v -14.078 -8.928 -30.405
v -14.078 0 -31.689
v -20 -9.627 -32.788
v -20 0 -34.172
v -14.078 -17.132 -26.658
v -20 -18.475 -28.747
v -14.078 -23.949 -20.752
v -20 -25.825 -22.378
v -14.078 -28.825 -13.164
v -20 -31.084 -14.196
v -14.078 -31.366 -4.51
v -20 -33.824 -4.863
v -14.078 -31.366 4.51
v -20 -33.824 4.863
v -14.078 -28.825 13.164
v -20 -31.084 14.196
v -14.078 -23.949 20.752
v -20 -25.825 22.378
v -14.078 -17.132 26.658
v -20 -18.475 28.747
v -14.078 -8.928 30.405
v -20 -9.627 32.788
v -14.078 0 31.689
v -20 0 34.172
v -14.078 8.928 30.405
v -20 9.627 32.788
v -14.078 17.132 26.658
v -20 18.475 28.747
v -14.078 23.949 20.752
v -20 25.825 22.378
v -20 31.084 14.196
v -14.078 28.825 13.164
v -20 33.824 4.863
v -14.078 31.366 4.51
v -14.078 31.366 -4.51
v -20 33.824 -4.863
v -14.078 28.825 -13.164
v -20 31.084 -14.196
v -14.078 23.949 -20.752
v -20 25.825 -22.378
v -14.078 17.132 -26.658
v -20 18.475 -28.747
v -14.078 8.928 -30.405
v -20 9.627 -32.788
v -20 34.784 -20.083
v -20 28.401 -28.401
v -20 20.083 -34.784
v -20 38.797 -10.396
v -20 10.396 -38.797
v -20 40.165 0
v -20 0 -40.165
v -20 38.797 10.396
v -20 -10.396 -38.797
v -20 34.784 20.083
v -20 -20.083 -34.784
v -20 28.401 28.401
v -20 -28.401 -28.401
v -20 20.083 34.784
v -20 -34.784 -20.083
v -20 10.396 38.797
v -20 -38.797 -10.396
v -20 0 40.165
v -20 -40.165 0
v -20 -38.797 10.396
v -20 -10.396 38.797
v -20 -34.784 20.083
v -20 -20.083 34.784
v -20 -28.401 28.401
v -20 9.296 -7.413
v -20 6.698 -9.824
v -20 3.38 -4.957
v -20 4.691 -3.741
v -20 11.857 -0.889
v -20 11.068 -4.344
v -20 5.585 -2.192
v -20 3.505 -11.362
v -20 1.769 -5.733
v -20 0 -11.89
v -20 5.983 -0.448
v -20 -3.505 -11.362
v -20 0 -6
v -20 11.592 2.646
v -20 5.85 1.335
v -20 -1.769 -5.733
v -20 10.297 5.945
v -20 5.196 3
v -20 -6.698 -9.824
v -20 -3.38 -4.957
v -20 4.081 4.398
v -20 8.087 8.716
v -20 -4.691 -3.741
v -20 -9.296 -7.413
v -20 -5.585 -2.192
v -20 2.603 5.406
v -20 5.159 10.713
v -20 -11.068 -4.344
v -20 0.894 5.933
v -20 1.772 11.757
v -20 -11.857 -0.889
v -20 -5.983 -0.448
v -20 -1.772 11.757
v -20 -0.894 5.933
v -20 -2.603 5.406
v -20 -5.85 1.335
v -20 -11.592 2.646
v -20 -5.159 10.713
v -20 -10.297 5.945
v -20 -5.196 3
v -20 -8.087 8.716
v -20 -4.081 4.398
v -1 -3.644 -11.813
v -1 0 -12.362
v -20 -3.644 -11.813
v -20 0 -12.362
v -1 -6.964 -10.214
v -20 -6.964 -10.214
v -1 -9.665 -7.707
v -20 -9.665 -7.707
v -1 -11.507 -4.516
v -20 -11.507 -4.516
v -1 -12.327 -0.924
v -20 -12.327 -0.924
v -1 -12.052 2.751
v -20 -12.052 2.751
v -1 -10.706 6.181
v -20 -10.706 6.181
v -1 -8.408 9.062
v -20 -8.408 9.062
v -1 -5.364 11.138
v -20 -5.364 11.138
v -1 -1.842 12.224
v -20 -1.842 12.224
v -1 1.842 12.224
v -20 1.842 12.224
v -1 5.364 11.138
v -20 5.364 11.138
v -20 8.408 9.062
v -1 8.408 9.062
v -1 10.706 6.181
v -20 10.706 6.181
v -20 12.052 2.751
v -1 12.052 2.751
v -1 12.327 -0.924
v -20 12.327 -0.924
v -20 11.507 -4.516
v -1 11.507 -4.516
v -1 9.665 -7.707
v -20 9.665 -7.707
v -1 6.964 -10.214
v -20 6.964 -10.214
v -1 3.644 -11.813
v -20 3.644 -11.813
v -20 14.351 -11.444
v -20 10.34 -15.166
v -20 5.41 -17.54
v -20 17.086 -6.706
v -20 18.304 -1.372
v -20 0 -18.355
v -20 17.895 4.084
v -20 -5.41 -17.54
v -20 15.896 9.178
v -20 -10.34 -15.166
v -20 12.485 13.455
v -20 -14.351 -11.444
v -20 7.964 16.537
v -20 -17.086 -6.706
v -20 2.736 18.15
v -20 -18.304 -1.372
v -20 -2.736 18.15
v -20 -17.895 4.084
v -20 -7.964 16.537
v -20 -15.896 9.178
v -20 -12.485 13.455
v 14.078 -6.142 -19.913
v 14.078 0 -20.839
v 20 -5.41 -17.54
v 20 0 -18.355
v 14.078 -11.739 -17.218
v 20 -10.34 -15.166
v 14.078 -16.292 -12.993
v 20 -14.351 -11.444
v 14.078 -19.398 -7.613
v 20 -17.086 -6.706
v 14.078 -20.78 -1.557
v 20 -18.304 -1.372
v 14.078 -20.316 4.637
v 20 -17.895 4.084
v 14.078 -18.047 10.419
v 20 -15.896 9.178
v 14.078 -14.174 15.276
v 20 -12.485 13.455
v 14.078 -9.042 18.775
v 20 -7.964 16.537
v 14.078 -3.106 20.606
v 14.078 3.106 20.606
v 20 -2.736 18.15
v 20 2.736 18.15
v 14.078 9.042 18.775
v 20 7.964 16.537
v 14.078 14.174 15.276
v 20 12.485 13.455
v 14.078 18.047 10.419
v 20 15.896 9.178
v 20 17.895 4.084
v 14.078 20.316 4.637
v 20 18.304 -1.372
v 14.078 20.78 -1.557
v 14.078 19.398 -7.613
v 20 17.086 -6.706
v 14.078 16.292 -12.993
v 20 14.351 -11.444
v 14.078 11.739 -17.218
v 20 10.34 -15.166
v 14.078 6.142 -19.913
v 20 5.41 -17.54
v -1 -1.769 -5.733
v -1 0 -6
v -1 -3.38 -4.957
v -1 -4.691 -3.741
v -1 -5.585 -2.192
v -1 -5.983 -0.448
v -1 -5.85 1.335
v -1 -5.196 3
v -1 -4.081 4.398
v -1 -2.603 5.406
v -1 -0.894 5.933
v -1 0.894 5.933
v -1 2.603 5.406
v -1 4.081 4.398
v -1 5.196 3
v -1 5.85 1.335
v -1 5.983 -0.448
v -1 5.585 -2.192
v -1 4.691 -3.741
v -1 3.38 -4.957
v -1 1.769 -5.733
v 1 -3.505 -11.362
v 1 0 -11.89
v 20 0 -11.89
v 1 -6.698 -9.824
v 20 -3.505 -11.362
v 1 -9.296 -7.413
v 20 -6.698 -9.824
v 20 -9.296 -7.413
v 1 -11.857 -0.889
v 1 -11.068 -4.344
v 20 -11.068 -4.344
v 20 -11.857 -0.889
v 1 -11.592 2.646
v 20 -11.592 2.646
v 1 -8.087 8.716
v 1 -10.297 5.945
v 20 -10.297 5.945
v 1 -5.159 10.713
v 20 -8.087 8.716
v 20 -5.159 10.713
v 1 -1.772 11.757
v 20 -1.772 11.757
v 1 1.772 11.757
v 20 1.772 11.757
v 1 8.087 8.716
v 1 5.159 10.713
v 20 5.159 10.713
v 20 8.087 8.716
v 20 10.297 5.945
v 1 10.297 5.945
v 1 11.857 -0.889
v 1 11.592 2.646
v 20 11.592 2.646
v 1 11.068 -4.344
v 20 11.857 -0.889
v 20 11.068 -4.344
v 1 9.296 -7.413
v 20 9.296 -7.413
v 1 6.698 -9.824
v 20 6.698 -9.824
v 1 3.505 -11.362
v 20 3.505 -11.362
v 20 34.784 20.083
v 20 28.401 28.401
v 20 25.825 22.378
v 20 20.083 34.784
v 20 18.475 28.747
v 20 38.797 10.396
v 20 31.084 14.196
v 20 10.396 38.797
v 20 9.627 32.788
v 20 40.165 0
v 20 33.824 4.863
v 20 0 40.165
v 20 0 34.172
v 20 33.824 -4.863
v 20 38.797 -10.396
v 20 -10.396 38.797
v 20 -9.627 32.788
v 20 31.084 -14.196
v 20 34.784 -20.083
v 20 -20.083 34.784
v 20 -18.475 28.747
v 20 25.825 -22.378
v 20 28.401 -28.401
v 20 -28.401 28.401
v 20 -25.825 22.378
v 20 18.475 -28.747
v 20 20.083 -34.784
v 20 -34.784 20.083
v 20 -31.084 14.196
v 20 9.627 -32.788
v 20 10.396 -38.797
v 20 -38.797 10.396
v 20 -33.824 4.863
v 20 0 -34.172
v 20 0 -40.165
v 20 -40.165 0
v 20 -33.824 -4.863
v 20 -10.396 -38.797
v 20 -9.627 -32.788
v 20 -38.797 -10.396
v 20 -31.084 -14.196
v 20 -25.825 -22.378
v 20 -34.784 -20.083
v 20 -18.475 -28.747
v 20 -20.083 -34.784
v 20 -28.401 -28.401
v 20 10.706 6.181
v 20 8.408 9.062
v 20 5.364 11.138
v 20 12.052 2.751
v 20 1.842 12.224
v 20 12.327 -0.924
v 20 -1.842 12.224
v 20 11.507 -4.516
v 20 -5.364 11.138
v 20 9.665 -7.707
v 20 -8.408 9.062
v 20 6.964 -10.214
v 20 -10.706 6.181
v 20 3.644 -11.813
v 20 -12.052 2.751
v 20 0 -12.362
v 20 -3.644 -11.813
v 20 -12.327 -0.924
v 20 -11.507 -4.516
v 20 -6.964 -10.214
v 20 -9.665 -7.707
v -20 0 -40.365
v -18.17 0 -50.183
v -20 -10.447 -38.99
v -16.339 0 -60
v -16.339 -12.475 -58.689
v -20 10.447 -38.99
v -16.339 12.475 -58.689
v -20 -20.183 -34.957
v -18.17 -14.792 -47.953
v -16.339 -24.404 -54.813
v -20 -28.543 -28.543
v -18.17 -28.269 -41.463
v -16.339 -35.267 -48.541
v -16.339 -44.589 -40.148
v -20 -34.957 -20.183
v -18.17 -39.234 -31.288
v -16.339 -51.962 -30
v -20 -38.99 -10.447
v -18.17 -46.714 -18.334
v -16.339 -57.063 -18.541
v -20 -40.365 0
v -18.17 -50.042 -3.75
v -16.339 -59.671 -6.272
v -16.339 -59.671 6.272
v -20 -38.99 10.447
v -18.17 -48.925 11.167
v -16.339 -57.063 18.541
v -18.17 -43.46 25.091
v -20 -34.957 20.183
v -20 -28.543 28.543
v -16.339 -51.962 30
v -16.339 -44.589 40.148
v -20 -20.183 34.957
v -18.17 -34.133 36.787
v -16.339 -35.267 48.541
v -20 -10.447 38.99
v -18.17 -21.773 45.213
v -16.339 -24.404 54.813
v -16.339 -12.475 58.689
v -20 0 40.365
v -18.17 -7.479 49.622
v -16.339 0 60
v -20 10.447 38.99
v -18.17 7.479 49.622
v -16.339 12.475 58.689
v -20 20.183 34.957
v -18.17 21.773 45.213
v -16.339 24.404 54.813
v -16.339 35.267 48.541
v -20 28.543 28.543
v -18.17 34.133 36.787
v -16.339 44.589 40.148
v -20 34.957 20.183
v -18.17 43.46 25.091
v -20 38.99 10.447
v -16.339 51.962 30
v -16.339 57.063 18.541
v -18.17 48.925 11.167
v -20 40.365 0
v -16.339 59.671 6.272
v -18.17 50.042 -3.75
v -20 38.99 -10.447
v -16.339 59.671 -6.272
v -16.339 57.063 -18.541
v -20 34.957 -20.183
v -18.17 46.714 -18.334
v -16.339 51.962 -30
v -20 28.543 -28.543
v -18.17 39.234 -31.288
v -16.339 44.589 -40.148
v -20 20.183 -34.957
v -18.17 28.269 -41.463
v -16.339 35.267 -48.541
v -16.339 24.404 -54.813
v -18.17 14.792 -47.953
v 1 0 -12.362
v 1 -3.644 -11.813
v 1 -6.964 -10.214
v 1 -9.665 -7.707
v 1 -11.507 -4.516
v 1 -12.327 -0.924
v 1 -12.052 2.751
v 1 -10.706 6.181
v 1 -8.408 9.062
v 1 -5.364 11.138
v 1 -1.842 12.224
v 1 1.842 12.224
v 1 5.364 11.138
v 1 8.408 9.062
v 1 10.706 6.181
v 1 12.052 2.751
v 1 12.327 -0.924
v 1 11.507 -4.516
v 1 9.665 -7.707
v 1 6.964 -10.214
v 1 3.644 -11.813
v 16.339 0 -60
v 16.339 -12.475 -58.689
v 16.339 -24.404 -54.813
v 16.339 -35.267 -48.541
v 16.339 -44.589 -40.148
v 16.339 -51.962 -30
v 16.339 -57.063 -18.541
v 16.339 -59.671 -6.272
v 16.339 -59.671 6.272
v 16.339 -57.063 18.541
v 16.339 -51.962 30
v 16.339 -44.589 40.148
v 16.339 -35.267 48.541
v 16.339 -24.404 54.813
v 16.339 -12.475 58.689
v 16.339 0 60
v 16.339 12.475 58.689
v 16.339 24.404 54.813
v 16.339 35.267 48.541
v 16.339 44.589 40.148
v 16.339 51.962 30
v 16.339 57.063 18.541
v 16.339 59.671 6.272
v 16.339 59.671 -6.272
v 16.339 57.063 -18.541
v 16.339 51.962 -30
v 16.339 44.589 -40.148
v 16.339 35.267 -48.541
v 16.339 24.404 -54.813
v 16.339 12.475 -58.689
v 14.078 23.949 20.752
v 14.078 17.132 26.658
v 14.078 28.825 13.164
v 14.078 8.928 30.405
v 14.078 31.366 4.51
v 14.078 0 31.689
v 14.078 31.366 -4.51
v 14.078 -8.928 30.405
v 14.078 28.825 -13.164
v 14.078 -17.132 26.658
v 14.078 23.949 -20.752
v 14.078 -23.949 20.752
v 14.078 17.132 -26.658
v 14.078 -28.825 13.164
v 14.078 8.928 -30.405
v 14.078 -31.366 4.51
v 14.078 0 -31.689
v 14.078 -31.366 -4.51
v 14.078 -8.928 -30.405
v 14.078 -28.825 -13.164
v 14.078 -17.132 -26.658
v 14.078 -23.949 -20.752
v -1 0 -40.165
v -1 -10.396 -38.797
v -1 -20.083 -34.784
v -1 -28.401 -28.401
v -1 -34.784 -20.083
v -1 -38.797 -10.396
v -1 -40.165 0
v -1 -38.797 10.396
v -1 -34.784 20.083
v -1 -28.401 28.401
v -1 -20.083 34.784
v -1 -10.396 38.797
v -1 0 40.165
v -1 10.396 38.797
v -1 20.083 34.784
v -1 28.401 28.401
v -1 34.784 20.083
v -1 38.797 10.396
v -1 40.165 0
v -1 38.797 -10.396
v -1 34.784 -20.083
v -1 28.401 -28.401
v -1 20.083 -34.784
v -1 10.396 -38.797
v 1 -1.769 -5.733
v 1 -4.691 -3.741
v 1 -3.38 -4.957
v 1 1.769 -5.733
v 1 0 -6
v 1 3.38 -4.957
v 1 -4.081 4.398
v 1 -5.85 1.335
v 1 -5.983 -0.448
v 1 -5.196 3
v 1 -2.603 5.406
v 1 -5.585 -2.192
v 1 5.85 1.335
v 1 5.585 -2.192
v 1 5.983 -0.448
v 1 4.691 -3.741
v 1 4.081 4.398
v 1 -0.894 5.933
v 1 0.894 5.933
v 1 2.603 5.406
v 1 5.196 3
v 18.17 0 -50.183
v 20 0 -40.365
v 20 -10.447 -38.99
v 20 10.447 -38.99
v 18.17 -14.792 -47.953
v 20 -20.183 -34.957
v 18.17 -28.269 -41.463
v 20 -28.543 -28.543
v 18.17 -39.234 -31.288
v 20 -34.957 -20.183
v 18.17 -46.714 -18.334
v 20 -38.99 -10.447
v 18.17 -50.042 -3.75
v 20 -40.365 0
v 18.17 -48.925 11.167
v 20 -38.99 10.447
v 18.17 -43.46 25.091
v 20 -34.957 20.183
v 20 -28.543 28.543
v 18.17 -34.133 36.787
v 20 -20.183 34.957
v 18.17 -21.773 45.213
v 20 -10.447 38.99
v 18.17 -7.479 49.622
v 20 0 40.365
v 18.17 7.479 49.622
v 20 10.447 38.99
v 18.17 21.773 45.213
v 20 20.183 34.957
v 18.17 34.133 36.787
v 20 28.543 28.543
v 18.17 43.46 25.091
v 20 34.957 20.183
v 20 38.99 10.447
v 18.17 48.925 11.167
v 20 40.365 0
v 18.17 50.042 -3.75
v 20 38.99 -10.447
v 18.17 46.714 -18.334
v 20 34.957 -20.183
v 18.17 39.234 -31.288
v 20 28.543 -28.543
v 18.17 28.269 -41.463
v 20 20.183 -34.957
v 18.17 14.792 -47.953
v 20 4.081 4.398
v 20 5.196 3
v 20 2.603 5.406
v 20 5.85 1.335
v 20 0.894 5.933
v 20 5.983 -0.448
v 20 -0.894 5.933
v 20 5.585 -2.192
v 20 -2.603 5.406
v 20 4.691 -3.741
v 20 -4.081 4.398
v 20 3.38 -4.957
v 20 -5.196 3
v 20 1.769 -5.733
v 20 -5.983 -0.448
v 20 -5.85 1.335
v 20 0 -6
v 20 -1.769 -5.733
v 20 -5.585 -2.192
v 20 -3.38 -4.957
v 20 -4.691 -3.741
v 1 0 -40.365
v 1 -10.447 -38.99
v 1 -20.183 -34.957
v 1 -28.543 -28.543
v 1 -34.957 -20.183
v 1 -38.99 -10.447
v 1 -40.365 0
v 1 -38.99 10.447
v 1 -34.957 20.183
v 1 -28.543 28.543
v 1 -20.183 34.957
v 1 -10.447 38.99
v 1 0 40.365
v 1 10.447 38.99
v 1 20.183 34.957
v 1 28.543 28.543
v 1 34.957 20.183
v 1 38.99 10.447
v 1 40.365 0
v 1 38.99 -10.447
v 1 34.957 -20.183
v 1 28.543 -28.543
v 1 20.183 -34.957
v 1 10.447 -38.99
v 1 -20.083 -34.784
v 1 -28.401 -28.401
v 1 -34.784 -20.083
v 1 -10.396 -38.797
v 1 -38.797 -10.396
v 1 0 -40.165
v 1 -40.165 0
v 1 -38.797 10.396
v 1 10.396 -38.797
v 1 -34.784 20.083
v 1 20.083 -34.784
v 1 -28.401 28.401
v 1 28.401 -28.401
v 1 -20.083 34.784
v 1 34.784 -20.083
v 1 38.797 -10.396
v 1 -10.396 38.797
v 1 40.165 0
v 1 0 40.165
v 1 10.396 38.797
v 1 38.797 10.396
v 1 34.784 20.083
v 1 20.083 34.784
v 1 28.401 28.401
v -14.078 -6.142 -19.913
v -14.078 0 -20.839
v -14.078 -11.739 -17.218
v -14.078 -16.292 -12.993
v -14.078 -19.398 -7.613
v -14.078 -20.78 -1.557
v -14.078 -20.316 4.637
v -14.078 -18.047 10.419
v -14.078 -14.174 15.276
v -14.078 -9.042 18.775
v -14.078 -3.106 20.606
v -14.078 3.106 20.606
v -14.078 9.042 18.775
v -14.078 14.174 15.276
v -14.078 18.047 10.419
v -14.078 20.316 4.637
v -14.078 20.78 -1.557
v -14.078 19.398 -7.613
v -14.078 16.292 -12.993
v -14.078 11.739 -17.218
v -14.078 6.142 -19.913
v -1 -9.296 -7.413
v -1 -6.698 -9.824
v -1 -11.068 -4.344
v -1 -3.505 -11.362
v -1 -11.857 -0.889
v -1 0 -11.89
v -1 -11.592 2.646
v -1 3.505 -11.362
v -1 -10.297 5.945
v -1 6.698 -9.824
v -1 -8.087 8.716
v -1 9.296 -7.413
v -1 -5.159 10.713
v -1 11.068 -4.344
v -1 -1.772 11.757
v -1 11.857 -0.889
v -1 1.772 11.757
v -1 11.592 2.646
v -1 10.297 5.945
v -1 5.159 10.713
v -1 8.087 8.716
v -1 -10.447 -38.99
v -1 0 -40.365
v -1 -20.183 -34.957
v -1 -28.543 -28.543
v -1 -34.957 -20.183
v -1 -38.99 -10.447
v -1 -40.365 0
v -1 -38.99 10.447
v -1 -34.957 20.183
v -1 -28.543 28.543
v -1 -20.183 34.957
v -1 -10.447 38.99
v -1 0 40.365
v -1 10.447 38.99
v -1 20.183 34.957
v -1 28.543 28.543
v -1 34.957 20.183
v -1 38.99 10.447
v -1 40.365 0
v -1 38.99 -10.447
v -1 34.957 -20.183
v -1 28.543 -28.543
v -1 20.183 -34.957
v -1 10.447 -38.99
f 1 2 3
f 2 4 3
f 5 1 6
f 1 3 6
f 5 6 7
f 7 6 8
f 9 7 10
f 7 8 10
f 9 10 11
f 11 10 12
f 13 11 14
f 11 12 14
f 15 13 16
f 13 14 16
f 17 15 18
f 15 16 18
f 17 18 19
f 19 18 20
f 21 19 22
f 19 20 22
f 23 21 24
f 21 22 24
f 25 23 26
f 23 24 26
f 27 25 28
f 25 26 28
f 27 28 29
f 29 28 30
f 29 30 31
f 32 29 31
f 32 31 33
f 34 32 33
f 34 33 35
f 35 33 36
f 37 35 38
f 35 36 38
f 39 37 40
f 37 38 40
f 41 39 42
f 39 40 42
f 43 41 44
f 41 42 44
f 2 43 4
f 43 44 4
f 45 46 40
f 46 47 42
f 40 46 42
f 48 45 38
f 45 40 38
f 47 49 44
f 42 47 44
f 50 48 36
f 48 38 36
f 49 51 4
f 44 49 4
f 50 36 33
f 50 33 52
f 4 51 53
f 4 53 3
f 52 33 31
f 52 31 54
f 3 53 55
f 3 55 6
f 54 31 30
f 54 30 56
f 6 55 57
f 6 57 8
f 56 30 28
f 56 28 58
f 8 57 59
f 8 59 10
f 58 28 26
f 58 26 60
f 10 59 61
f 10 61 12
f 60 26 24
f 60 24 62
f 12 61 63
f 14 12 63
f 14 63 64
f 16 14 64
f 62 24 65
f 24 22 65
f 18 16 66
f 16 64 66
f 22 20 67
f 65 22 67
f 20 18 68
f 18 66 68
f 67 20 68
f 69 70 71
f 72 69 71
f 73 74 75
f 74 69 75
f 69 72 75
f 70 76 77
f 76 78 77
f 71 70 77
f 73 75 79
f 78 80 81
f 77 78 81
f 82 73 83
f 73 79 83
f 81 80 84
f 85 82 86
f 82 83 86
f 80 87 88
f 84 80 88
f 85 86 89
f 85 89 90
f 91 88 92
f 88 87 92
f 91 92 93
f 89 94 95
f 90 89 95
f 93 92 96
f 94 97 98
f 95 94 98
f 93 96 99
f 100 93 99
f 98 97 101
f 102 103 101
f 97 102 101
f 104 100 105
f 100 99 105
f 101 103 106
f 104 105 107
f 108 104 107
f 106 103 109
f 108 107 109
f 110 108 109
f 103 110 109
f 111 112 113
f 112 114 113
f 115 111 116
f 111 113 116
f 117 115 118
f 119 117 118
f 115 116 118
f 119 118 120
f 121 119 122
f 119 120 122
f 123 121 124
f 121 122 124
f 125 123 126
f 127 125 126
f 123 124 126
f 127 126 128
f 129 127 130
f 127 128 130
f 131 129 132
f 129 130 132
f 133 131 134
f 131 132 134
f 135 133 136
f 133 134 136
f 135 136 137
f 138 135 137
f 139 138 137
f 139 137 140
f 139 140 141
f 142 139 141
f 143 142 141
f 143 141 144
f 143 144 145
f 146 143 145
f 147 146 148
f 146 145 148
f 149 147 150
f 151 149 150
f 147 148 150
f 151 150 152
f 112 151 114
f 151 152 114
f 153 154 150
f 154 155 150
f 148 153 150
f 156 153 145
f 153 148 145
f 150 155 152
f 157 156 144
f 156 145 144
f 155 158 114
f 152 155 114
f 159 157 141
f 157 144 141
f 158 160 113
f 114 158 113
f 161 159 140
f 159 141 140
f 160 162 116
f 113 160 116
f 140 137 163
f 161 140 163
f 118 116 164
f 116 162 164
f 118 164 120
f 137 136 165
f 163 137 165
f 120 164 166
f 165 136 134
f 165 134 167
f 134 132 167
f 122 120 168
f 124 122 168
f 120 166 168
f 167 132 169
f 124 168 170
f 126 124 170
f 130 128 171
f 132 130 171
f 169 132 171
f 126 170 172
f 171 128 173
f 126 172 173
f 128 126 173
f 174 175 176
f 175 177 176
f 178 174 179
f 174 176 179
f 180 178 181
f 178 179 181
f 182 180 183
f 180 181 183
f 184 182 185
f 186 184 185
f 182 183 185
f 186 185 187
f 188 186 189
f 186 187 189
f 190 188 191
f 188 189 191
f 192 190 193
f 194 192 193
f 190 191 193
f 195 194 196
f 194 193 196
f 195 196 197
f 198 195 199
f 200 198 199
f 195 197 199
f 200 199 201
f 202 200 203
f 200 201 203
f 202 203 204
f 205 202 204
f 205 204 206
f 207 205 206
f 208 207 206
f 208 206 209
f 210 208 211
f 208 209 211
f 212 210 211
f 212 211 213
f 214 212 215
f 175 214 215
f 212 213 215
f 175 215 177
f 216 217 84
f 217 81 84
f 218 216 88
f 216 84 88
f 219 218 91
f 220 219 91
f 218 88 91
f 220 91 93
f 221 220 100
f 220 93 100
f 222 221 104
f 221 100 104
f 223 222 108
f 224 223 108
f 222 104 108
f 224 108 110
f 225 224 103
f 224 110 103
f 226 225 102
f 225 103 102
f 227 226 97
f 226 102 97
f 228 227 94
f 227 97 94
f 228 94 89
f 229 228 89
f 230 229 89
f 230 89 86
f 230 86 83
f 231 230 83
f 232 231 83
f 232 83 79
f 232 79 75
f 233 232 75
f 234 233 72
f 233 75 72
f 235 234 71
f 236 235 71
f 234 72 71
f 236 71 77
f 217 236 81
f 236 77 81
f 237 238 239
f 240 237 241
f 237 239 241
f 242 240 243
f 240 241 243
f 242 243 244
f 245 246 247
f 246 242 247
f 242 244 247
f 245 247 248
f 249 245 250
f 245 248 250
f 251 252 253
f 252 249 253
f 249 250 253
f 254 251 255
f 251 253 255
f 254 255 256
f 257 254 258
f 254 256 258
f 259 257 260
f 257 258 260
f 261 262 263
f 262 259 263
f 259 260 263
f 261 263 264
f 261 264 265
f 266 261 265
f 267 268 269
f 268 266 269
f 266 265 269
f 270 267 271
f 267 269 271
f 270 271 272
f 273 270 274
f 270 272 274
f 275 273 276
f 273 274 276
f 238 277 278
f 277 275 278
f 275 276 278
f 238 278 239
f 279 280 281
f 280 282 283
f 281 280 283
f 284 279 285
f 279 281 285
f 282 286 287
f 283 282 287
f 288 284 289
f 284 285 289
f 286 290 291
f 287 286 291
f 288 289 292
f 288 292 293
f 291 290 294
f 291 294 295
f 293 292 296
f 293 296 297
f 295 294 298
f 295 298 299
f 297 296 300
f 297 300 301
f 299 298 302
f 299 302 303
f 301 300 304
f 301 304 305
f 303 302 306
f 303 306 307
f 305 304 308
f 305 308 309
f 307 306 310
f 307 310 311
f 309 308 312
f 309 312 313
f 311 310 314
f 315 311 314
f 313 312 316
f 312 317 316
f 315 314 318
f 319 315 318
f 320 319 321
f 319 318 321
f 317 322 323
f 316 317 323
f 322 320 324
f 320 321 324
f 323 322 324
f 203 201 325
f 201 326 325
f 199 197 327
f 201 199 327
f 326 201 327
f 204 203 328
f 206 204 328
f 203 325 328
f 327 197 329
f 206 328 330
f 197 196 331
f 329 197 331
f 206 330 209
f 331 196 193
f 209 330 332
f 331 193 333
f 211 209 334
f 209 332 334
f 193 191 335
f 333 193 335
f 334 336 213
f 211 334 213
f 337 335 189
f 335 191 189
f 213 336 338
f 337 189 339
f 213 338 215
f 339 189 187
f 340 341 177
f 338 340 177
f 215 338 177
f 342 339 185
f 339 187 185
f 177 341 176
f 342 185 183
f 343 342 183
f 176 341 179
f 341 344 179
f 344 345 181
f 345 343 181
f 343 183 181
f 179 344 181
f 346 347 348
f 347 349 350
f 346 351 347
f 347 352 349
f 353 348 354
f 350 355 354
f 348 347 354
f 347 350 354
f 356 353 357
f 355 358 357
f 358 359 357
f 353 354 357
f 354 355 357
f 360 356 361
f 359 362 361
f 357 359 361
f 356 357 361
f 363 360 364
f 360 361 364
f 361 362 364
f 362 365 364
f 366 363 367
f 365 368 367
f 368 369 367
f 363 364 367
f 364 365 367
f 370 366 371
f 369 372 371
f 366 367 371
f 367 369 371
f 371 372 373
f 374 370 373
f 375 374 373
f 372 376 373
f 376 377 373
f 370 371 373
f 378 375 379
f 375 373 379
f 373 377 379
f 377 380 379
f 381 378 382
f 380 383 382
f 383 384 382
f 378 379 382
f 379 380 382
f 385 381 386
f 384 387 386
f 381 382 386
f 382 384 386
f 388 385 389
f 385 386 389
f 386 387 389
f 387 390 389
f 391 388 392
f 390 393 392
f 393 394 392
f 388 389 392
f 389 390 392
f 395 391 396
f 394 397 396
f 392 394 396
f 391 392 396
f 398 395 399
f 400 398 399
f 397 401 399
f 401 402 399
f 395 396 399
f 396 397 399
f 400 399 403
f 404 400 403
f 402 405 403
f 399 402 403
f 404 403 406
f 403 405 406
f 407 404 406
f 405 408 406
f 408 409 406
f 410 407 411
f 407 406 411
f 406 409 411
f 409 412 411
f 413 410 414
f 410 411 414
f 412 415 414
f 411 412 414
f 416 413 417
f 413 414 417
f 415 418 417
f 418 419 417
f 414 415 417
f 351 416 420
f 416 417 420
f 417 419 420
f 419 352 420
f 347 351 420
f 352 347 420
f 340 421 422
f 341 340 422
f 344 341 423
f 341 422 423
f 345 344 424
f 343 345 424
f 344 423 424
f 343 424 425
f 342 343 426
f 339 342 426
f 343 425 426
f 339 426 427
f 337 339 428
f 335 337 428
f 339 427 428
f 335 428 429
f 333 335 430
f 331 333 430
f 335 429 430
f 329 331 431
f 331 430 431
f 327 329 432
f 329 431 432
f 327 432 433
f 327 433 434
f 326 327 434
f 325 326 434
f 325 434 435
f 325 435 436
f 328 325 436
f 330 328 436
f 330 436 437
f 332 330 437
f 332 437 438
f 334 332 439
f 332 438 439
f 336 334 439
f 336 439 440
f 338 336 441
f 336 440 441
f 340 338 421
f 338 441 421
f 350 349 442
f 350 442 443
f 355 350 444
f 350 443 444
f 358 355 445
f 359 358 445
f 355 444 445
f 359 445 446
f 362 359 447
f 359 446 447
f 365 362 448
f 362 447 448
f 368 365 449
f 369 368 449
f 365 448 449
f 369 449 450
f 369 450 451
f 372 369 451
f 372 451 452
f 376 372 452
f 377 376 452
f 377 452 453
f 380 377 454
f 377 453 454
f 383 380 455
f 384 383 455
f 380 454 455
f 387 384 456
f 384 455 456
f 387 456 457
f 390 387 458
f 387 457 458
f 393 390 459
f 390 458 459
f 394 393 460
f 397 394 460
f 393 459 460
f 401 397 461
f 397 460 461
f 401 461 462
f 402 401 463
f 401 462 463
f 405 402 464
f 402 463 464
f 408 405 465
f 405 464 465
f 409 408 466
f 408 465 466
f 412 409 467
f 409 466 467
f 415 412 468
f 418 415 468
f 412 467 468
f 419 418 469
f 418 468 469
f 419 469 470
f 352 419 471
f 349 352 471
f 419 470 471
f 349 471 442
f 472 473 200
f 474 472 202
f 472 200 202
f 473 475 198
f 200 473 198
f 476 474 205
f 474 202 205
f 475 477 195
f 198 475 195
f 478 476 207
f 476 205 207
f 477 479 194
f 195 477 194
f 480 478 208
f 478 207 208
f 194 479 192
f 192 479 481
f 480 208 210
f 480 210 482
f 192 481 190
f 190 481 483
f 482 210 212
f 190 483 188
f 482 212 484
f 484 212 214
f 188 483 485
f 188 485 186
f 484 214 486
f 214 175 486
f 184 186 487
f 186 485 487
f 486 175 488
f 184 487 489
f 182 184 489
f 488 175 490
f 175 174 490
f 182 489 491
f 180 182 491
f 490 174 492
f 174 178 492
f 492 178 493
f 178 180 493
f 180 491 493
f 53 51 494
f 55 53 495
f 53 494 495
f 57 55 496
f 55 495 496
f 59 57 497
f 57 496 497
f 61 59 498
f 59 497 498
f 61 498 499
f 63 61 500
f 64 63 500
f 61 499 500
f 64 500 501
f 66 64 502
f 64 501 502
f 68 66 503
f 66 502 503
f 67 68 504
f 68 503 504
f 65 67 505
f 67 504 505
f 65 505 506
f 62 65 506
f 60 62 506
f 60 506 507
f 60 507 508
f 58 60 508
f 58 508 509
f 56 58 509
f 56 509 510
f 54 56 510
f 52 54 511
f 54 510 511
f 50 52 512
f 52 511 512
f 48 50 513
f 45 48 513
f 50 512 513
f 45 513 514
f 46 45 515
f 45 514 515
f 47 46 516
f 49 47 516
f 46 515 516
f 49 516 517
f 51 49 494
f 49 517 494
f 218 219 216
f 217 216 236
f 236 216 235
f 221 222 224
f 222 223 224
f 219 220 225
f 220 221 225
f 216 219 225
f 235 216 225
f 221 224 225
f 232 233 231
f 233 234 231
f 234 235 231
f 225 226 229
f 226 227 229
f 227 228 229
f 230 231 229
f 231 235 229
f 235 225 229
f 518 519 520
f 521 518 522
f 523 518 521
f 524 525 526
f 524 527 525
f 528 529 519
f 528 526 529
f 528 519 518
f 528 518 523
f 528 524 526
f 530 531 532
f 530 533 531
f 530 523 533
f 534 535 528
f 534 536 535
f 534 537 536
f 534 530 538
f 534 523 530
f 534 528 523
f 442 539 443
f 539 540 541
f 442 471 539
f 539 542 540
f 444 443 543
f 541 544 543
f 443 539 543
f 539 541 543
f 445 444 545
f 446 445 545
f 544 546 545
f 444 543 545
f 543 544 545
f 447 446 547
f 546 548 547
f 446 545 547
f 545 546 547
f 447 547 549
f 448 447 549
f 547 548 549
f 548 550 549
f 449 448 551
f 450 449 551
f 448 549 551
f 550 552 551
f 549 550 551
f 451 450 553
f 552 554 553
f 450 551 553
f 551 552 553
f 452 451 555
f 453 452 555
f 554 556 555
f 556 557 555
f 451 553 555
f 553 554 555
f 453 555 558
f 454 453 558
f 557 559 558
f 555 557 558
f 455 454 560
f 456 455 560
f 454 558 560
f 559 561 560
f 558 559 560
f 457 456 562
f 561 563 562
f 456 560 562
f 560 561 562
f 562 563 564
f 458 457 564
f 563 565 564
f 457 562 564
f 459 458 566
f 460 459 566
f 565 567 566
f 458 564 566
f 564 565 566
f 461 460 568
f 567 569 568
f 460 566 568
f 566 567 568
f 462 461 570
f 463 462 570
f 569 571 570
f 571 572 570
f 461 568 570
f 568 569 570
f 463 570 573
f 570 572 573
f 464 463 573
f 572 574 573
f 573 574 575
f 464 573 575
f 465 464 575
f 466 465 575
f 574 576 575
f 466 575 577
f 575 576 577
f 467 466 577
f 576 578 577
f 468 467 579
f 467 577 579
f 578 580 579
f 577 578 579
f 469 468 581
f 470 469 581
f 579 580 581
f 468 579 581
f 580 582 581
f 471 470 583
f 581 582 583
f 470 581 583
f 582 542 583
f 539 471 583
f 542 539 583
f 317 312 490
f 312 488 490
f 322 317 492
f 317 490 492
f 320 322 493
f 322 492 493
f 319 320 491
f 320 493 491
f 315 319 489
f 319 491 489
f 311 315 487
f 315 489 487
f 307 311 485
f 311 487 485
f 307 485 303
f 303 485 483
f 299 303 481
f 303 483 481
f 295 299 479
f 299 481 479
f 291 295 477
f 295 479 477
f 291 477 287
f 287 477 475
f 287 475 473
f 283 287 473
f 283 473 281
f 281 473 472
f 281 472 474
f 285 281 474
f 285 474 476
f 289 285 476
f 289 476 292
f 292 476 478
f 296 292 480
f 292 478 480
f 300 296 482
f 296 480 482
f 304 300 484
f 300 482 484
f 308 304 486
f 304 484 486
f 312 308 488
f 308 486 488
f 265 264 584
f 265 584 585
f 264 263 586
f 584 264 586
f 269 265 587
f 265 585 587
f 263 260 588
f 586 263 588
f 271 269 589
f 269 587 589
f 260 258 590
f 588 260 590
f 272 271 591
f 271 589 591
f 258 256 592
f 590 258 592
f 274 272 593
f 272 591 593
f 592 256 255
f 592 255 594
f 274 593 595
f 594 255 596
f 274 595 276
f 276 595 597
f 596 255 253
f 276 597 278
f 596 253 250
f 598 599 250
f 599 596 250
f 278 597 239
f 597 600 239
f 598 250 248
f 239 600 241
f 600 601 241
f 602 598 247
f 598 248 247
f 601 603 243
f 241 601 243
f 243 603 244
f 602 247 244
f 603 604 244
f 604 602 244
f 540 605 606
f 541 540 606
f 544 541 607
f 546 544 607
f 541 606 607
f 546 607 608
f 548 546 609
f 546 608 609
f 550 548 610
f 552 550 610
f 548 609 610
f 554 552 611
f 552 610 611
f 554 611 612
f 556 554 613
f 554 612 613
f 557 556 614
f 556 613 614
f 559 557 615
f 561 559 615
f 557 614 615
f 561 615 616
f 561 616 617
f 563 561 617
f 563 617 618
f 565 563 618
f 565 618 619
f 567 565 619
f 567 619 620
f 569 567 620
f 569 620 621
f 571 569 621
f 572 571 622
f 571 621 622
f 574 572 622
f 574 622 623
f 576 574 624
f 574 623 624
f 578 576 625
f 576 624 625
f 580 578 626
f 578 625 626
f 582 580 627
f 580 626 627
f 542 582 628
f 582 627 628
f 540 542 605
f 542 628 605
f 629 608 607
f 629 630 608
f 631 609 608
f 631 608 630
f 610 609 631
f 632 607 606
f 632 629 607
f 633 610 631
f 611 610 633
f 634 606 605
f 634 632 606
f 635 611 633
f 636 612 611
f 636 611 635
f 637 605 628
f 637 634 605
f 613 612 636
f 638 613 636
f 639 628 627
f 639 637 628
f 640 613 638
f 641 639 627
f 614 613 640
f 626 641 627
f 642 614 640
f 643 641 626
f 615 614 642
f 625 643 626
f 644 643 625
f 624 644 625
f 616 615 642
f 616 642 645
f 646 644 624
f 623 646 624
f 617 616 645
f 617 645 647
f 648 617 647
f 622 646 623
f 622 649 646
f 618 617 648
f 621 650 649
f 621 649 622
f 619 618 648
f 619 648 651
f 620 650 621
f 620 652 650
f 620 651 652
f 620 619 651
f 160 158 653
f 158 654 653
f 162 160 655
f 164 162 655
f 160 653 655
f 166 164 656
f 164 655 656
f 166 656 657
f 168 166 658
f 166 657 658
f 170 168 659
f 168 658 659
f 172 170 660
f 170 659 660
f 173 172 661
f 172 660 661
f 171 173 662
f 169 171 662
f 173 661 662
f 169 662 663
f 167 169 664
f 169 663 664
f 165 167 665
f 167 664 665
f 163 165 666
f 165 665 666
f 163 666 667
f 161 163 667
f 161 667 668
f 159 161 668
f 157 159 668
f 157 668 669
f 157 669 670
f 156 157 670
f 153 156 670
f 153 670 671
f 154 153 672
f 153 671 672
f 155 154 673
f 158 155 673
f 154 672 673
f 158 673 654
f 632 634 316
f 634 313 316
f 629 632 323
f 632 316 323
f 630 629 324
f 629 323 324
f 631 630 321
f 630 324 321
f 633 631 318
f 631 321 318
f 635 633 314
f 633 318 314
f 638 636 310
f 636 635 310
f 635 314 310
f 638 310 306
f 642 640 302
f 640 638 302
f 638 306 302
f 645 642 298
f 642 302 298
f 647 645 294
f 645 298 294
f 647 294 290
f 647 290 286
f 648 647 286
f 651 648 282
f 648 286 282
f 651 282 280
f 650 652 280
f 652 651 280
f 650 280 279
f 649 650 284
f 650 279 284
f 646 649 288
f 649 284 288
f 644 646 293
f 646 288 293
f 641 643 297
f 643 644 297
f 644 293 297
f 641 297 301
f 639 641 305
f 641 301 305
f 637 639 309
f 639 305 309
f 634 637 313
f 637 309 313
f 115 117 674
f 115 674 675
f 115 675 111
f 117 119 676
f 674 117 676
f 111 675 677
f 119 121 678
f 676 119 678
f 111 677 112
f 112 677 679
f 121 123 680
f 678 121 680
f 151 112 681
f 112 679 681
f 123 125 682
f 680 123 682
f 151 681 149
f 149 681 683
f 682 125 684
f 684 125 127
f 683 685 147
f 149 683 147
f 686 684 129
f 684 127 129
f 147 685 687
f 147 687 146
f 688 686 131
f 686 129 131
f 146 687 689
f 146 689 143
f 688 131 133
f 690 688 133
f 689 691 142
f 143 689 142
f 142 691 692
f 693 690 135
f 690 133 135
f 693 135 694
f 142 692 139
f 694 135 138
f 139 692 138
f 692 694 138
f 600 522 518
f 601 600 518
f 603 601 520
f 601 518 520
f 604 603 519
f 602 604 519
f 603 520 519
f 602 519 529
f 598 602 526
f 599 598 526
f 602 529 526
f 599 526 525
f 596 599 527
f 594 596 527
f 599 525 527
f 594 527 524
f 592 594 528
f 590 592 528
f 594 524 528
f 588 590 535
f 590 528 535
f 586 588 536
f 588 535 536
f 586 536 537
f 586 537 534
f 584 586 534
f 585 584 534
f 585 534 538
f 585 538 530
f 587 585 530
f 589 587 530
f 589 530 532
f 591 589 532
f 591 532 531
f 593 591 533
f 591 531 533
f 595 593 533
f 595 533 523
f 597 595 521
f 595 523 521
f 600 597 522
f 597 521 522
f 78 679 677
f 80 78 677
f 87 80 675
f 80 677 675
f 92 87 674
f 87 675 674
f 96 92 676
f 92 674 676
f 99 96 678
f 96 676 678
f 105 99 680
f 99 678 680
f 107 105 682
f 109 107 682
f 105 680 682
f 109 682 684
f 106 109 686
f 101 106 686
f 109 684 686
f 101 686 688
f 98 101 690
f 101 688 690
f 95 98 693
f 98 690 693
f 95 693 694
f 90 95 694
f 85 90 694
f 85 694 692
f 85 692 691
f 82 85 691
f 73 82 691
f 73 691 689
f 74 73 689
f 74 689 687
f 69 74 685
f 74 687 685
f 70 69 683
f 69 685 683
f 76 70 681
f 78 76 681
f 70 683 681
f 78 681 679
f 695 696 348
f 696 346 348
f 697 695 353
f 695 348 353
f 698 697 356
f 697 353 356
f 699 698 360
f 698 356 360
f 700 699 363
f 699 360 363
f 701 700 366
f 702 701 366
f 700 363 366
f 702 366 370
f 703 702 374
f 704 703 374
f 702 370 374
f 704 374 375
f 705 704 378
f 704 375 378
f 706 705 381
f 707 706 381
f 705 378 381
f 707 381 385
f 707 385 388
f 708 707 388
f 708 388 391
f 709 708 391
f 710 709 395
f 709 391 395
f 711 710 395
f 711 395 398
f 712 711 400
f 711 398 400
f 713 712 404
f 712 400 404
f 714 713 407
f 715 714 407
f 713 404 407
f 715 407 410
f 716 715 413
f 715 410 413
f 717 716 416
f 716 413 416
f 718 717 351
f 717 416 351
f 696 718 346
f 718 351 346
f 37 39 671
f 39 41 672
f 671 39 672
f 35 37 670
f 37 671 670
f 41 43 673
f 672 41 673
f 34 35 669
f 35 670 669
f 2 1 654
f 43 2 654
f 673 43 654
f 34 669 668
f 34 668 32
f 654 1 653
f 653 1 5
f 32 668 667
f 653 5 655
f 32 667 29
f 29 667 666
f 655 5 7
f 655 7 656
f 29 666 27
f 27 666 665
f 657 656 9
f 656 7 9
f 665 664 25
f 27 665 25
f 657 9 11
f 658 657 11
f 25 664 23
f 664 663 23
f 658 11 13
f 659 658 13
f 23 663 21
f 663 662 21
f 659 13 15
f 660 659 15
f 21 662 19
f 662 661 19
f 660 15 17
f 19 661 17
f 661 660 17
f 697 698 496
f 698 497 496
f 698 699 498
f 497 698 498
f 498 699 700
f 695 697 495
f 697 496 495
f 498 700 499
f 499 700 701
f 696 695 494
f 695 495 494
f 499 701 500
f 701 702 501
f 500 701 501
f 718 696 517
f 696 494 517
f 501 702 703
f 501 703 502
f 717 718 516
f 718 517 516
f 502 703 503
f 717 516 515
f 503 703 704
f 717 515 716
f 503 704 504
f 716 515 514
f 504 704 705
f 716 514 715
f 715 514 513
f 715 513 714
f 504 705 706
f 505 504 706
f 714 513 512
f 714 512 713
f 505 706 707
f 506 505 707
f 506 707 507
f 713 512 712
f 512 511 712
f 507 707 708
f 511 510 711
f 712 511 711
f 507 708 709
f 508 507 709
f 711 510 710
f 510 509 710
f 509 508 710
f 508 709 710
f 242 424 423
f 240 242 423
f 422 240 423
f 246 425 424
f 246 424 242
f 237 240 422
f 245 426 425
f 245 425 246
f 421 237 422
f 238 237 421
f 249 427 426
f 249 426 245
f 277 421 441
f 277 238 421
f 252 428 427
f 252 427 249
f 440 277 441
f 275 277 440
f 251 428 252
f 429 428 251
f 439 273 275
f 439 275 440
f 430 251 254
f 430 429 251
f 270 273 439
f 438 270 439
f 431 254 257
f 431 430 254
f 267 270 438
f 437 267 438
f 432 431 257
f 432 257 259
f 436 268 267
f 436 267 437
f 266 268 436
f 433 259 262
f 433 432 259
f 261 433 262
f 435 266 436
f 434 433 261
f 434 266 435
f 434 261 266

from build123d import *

# Parameters (mm, degrees)
F2_R     = 47.0938119368
F3_DEPTH = 1


with BuildPart() as f1:
    # F0 (on Front) → F1 (revolve)
    with BuildSketch(Plane.XZ):
        Polygon((-20, -11.8900358561), (0, -11.8900358561), (20, -11.8900358561), (20, -6), (0, -6), (-20, -6), align=None)
    revolve(axis=Axis((-66.6633010662, 0, 0), (-1, 0, 0)))



with BuildPart() as f1b:
    # F0 (on Front) → F1, piece 2 (revolve)
    with BuildSketch(Plane.XZ):
        Polygon((-16.3393602265, -60), (0, -60), (16.3393602265, -60), (20, -40.3654314578), (0, -40.3654314578), (-20, -40.3654314578), align=None)
    revolve(axis=Axis((-66.6633010662, 0, 0), (-1, 0, 0)))


with BuildPart() as f1c:
    # F0 (on Front) → F1, piece 3 (revolve)
    with BuildSketch(Plane.XZ):
        Polygon((0, -40.1654314578), (20, -40.1654314578), (20, -34.172013402), (14.0782324597, -31.6885687669), (14.0782324597, -20.8386002505), (20, -18.3551556154), (20, -12.3617375596), (0, -12.3617375596), (-20, -12.3617375596), (-20, -18.3551556154), (-14.0782324597, -20.8386002505), (-14.0782324597, -31.6885687669), (-20, -34.172013402), (-20, -40.1654314578), align=None)
    revolve(axis=Axis((-66.6633010662, 0, 0), (-1, 0, 0)))


with BuildPart() as f1_1:
    add(f1.part)

    add(f1b.part)  # F3 merges F1b

    add(f1c.part)  # F3 merges F1c
    # F2 (on Right) → F3 (join, symmetric)
    with BuildSketch(Plane.YZ):
        Circle(F2_R)
    extrude(amount=F3_DEPTH, both=True)


solid = f1_1.part
